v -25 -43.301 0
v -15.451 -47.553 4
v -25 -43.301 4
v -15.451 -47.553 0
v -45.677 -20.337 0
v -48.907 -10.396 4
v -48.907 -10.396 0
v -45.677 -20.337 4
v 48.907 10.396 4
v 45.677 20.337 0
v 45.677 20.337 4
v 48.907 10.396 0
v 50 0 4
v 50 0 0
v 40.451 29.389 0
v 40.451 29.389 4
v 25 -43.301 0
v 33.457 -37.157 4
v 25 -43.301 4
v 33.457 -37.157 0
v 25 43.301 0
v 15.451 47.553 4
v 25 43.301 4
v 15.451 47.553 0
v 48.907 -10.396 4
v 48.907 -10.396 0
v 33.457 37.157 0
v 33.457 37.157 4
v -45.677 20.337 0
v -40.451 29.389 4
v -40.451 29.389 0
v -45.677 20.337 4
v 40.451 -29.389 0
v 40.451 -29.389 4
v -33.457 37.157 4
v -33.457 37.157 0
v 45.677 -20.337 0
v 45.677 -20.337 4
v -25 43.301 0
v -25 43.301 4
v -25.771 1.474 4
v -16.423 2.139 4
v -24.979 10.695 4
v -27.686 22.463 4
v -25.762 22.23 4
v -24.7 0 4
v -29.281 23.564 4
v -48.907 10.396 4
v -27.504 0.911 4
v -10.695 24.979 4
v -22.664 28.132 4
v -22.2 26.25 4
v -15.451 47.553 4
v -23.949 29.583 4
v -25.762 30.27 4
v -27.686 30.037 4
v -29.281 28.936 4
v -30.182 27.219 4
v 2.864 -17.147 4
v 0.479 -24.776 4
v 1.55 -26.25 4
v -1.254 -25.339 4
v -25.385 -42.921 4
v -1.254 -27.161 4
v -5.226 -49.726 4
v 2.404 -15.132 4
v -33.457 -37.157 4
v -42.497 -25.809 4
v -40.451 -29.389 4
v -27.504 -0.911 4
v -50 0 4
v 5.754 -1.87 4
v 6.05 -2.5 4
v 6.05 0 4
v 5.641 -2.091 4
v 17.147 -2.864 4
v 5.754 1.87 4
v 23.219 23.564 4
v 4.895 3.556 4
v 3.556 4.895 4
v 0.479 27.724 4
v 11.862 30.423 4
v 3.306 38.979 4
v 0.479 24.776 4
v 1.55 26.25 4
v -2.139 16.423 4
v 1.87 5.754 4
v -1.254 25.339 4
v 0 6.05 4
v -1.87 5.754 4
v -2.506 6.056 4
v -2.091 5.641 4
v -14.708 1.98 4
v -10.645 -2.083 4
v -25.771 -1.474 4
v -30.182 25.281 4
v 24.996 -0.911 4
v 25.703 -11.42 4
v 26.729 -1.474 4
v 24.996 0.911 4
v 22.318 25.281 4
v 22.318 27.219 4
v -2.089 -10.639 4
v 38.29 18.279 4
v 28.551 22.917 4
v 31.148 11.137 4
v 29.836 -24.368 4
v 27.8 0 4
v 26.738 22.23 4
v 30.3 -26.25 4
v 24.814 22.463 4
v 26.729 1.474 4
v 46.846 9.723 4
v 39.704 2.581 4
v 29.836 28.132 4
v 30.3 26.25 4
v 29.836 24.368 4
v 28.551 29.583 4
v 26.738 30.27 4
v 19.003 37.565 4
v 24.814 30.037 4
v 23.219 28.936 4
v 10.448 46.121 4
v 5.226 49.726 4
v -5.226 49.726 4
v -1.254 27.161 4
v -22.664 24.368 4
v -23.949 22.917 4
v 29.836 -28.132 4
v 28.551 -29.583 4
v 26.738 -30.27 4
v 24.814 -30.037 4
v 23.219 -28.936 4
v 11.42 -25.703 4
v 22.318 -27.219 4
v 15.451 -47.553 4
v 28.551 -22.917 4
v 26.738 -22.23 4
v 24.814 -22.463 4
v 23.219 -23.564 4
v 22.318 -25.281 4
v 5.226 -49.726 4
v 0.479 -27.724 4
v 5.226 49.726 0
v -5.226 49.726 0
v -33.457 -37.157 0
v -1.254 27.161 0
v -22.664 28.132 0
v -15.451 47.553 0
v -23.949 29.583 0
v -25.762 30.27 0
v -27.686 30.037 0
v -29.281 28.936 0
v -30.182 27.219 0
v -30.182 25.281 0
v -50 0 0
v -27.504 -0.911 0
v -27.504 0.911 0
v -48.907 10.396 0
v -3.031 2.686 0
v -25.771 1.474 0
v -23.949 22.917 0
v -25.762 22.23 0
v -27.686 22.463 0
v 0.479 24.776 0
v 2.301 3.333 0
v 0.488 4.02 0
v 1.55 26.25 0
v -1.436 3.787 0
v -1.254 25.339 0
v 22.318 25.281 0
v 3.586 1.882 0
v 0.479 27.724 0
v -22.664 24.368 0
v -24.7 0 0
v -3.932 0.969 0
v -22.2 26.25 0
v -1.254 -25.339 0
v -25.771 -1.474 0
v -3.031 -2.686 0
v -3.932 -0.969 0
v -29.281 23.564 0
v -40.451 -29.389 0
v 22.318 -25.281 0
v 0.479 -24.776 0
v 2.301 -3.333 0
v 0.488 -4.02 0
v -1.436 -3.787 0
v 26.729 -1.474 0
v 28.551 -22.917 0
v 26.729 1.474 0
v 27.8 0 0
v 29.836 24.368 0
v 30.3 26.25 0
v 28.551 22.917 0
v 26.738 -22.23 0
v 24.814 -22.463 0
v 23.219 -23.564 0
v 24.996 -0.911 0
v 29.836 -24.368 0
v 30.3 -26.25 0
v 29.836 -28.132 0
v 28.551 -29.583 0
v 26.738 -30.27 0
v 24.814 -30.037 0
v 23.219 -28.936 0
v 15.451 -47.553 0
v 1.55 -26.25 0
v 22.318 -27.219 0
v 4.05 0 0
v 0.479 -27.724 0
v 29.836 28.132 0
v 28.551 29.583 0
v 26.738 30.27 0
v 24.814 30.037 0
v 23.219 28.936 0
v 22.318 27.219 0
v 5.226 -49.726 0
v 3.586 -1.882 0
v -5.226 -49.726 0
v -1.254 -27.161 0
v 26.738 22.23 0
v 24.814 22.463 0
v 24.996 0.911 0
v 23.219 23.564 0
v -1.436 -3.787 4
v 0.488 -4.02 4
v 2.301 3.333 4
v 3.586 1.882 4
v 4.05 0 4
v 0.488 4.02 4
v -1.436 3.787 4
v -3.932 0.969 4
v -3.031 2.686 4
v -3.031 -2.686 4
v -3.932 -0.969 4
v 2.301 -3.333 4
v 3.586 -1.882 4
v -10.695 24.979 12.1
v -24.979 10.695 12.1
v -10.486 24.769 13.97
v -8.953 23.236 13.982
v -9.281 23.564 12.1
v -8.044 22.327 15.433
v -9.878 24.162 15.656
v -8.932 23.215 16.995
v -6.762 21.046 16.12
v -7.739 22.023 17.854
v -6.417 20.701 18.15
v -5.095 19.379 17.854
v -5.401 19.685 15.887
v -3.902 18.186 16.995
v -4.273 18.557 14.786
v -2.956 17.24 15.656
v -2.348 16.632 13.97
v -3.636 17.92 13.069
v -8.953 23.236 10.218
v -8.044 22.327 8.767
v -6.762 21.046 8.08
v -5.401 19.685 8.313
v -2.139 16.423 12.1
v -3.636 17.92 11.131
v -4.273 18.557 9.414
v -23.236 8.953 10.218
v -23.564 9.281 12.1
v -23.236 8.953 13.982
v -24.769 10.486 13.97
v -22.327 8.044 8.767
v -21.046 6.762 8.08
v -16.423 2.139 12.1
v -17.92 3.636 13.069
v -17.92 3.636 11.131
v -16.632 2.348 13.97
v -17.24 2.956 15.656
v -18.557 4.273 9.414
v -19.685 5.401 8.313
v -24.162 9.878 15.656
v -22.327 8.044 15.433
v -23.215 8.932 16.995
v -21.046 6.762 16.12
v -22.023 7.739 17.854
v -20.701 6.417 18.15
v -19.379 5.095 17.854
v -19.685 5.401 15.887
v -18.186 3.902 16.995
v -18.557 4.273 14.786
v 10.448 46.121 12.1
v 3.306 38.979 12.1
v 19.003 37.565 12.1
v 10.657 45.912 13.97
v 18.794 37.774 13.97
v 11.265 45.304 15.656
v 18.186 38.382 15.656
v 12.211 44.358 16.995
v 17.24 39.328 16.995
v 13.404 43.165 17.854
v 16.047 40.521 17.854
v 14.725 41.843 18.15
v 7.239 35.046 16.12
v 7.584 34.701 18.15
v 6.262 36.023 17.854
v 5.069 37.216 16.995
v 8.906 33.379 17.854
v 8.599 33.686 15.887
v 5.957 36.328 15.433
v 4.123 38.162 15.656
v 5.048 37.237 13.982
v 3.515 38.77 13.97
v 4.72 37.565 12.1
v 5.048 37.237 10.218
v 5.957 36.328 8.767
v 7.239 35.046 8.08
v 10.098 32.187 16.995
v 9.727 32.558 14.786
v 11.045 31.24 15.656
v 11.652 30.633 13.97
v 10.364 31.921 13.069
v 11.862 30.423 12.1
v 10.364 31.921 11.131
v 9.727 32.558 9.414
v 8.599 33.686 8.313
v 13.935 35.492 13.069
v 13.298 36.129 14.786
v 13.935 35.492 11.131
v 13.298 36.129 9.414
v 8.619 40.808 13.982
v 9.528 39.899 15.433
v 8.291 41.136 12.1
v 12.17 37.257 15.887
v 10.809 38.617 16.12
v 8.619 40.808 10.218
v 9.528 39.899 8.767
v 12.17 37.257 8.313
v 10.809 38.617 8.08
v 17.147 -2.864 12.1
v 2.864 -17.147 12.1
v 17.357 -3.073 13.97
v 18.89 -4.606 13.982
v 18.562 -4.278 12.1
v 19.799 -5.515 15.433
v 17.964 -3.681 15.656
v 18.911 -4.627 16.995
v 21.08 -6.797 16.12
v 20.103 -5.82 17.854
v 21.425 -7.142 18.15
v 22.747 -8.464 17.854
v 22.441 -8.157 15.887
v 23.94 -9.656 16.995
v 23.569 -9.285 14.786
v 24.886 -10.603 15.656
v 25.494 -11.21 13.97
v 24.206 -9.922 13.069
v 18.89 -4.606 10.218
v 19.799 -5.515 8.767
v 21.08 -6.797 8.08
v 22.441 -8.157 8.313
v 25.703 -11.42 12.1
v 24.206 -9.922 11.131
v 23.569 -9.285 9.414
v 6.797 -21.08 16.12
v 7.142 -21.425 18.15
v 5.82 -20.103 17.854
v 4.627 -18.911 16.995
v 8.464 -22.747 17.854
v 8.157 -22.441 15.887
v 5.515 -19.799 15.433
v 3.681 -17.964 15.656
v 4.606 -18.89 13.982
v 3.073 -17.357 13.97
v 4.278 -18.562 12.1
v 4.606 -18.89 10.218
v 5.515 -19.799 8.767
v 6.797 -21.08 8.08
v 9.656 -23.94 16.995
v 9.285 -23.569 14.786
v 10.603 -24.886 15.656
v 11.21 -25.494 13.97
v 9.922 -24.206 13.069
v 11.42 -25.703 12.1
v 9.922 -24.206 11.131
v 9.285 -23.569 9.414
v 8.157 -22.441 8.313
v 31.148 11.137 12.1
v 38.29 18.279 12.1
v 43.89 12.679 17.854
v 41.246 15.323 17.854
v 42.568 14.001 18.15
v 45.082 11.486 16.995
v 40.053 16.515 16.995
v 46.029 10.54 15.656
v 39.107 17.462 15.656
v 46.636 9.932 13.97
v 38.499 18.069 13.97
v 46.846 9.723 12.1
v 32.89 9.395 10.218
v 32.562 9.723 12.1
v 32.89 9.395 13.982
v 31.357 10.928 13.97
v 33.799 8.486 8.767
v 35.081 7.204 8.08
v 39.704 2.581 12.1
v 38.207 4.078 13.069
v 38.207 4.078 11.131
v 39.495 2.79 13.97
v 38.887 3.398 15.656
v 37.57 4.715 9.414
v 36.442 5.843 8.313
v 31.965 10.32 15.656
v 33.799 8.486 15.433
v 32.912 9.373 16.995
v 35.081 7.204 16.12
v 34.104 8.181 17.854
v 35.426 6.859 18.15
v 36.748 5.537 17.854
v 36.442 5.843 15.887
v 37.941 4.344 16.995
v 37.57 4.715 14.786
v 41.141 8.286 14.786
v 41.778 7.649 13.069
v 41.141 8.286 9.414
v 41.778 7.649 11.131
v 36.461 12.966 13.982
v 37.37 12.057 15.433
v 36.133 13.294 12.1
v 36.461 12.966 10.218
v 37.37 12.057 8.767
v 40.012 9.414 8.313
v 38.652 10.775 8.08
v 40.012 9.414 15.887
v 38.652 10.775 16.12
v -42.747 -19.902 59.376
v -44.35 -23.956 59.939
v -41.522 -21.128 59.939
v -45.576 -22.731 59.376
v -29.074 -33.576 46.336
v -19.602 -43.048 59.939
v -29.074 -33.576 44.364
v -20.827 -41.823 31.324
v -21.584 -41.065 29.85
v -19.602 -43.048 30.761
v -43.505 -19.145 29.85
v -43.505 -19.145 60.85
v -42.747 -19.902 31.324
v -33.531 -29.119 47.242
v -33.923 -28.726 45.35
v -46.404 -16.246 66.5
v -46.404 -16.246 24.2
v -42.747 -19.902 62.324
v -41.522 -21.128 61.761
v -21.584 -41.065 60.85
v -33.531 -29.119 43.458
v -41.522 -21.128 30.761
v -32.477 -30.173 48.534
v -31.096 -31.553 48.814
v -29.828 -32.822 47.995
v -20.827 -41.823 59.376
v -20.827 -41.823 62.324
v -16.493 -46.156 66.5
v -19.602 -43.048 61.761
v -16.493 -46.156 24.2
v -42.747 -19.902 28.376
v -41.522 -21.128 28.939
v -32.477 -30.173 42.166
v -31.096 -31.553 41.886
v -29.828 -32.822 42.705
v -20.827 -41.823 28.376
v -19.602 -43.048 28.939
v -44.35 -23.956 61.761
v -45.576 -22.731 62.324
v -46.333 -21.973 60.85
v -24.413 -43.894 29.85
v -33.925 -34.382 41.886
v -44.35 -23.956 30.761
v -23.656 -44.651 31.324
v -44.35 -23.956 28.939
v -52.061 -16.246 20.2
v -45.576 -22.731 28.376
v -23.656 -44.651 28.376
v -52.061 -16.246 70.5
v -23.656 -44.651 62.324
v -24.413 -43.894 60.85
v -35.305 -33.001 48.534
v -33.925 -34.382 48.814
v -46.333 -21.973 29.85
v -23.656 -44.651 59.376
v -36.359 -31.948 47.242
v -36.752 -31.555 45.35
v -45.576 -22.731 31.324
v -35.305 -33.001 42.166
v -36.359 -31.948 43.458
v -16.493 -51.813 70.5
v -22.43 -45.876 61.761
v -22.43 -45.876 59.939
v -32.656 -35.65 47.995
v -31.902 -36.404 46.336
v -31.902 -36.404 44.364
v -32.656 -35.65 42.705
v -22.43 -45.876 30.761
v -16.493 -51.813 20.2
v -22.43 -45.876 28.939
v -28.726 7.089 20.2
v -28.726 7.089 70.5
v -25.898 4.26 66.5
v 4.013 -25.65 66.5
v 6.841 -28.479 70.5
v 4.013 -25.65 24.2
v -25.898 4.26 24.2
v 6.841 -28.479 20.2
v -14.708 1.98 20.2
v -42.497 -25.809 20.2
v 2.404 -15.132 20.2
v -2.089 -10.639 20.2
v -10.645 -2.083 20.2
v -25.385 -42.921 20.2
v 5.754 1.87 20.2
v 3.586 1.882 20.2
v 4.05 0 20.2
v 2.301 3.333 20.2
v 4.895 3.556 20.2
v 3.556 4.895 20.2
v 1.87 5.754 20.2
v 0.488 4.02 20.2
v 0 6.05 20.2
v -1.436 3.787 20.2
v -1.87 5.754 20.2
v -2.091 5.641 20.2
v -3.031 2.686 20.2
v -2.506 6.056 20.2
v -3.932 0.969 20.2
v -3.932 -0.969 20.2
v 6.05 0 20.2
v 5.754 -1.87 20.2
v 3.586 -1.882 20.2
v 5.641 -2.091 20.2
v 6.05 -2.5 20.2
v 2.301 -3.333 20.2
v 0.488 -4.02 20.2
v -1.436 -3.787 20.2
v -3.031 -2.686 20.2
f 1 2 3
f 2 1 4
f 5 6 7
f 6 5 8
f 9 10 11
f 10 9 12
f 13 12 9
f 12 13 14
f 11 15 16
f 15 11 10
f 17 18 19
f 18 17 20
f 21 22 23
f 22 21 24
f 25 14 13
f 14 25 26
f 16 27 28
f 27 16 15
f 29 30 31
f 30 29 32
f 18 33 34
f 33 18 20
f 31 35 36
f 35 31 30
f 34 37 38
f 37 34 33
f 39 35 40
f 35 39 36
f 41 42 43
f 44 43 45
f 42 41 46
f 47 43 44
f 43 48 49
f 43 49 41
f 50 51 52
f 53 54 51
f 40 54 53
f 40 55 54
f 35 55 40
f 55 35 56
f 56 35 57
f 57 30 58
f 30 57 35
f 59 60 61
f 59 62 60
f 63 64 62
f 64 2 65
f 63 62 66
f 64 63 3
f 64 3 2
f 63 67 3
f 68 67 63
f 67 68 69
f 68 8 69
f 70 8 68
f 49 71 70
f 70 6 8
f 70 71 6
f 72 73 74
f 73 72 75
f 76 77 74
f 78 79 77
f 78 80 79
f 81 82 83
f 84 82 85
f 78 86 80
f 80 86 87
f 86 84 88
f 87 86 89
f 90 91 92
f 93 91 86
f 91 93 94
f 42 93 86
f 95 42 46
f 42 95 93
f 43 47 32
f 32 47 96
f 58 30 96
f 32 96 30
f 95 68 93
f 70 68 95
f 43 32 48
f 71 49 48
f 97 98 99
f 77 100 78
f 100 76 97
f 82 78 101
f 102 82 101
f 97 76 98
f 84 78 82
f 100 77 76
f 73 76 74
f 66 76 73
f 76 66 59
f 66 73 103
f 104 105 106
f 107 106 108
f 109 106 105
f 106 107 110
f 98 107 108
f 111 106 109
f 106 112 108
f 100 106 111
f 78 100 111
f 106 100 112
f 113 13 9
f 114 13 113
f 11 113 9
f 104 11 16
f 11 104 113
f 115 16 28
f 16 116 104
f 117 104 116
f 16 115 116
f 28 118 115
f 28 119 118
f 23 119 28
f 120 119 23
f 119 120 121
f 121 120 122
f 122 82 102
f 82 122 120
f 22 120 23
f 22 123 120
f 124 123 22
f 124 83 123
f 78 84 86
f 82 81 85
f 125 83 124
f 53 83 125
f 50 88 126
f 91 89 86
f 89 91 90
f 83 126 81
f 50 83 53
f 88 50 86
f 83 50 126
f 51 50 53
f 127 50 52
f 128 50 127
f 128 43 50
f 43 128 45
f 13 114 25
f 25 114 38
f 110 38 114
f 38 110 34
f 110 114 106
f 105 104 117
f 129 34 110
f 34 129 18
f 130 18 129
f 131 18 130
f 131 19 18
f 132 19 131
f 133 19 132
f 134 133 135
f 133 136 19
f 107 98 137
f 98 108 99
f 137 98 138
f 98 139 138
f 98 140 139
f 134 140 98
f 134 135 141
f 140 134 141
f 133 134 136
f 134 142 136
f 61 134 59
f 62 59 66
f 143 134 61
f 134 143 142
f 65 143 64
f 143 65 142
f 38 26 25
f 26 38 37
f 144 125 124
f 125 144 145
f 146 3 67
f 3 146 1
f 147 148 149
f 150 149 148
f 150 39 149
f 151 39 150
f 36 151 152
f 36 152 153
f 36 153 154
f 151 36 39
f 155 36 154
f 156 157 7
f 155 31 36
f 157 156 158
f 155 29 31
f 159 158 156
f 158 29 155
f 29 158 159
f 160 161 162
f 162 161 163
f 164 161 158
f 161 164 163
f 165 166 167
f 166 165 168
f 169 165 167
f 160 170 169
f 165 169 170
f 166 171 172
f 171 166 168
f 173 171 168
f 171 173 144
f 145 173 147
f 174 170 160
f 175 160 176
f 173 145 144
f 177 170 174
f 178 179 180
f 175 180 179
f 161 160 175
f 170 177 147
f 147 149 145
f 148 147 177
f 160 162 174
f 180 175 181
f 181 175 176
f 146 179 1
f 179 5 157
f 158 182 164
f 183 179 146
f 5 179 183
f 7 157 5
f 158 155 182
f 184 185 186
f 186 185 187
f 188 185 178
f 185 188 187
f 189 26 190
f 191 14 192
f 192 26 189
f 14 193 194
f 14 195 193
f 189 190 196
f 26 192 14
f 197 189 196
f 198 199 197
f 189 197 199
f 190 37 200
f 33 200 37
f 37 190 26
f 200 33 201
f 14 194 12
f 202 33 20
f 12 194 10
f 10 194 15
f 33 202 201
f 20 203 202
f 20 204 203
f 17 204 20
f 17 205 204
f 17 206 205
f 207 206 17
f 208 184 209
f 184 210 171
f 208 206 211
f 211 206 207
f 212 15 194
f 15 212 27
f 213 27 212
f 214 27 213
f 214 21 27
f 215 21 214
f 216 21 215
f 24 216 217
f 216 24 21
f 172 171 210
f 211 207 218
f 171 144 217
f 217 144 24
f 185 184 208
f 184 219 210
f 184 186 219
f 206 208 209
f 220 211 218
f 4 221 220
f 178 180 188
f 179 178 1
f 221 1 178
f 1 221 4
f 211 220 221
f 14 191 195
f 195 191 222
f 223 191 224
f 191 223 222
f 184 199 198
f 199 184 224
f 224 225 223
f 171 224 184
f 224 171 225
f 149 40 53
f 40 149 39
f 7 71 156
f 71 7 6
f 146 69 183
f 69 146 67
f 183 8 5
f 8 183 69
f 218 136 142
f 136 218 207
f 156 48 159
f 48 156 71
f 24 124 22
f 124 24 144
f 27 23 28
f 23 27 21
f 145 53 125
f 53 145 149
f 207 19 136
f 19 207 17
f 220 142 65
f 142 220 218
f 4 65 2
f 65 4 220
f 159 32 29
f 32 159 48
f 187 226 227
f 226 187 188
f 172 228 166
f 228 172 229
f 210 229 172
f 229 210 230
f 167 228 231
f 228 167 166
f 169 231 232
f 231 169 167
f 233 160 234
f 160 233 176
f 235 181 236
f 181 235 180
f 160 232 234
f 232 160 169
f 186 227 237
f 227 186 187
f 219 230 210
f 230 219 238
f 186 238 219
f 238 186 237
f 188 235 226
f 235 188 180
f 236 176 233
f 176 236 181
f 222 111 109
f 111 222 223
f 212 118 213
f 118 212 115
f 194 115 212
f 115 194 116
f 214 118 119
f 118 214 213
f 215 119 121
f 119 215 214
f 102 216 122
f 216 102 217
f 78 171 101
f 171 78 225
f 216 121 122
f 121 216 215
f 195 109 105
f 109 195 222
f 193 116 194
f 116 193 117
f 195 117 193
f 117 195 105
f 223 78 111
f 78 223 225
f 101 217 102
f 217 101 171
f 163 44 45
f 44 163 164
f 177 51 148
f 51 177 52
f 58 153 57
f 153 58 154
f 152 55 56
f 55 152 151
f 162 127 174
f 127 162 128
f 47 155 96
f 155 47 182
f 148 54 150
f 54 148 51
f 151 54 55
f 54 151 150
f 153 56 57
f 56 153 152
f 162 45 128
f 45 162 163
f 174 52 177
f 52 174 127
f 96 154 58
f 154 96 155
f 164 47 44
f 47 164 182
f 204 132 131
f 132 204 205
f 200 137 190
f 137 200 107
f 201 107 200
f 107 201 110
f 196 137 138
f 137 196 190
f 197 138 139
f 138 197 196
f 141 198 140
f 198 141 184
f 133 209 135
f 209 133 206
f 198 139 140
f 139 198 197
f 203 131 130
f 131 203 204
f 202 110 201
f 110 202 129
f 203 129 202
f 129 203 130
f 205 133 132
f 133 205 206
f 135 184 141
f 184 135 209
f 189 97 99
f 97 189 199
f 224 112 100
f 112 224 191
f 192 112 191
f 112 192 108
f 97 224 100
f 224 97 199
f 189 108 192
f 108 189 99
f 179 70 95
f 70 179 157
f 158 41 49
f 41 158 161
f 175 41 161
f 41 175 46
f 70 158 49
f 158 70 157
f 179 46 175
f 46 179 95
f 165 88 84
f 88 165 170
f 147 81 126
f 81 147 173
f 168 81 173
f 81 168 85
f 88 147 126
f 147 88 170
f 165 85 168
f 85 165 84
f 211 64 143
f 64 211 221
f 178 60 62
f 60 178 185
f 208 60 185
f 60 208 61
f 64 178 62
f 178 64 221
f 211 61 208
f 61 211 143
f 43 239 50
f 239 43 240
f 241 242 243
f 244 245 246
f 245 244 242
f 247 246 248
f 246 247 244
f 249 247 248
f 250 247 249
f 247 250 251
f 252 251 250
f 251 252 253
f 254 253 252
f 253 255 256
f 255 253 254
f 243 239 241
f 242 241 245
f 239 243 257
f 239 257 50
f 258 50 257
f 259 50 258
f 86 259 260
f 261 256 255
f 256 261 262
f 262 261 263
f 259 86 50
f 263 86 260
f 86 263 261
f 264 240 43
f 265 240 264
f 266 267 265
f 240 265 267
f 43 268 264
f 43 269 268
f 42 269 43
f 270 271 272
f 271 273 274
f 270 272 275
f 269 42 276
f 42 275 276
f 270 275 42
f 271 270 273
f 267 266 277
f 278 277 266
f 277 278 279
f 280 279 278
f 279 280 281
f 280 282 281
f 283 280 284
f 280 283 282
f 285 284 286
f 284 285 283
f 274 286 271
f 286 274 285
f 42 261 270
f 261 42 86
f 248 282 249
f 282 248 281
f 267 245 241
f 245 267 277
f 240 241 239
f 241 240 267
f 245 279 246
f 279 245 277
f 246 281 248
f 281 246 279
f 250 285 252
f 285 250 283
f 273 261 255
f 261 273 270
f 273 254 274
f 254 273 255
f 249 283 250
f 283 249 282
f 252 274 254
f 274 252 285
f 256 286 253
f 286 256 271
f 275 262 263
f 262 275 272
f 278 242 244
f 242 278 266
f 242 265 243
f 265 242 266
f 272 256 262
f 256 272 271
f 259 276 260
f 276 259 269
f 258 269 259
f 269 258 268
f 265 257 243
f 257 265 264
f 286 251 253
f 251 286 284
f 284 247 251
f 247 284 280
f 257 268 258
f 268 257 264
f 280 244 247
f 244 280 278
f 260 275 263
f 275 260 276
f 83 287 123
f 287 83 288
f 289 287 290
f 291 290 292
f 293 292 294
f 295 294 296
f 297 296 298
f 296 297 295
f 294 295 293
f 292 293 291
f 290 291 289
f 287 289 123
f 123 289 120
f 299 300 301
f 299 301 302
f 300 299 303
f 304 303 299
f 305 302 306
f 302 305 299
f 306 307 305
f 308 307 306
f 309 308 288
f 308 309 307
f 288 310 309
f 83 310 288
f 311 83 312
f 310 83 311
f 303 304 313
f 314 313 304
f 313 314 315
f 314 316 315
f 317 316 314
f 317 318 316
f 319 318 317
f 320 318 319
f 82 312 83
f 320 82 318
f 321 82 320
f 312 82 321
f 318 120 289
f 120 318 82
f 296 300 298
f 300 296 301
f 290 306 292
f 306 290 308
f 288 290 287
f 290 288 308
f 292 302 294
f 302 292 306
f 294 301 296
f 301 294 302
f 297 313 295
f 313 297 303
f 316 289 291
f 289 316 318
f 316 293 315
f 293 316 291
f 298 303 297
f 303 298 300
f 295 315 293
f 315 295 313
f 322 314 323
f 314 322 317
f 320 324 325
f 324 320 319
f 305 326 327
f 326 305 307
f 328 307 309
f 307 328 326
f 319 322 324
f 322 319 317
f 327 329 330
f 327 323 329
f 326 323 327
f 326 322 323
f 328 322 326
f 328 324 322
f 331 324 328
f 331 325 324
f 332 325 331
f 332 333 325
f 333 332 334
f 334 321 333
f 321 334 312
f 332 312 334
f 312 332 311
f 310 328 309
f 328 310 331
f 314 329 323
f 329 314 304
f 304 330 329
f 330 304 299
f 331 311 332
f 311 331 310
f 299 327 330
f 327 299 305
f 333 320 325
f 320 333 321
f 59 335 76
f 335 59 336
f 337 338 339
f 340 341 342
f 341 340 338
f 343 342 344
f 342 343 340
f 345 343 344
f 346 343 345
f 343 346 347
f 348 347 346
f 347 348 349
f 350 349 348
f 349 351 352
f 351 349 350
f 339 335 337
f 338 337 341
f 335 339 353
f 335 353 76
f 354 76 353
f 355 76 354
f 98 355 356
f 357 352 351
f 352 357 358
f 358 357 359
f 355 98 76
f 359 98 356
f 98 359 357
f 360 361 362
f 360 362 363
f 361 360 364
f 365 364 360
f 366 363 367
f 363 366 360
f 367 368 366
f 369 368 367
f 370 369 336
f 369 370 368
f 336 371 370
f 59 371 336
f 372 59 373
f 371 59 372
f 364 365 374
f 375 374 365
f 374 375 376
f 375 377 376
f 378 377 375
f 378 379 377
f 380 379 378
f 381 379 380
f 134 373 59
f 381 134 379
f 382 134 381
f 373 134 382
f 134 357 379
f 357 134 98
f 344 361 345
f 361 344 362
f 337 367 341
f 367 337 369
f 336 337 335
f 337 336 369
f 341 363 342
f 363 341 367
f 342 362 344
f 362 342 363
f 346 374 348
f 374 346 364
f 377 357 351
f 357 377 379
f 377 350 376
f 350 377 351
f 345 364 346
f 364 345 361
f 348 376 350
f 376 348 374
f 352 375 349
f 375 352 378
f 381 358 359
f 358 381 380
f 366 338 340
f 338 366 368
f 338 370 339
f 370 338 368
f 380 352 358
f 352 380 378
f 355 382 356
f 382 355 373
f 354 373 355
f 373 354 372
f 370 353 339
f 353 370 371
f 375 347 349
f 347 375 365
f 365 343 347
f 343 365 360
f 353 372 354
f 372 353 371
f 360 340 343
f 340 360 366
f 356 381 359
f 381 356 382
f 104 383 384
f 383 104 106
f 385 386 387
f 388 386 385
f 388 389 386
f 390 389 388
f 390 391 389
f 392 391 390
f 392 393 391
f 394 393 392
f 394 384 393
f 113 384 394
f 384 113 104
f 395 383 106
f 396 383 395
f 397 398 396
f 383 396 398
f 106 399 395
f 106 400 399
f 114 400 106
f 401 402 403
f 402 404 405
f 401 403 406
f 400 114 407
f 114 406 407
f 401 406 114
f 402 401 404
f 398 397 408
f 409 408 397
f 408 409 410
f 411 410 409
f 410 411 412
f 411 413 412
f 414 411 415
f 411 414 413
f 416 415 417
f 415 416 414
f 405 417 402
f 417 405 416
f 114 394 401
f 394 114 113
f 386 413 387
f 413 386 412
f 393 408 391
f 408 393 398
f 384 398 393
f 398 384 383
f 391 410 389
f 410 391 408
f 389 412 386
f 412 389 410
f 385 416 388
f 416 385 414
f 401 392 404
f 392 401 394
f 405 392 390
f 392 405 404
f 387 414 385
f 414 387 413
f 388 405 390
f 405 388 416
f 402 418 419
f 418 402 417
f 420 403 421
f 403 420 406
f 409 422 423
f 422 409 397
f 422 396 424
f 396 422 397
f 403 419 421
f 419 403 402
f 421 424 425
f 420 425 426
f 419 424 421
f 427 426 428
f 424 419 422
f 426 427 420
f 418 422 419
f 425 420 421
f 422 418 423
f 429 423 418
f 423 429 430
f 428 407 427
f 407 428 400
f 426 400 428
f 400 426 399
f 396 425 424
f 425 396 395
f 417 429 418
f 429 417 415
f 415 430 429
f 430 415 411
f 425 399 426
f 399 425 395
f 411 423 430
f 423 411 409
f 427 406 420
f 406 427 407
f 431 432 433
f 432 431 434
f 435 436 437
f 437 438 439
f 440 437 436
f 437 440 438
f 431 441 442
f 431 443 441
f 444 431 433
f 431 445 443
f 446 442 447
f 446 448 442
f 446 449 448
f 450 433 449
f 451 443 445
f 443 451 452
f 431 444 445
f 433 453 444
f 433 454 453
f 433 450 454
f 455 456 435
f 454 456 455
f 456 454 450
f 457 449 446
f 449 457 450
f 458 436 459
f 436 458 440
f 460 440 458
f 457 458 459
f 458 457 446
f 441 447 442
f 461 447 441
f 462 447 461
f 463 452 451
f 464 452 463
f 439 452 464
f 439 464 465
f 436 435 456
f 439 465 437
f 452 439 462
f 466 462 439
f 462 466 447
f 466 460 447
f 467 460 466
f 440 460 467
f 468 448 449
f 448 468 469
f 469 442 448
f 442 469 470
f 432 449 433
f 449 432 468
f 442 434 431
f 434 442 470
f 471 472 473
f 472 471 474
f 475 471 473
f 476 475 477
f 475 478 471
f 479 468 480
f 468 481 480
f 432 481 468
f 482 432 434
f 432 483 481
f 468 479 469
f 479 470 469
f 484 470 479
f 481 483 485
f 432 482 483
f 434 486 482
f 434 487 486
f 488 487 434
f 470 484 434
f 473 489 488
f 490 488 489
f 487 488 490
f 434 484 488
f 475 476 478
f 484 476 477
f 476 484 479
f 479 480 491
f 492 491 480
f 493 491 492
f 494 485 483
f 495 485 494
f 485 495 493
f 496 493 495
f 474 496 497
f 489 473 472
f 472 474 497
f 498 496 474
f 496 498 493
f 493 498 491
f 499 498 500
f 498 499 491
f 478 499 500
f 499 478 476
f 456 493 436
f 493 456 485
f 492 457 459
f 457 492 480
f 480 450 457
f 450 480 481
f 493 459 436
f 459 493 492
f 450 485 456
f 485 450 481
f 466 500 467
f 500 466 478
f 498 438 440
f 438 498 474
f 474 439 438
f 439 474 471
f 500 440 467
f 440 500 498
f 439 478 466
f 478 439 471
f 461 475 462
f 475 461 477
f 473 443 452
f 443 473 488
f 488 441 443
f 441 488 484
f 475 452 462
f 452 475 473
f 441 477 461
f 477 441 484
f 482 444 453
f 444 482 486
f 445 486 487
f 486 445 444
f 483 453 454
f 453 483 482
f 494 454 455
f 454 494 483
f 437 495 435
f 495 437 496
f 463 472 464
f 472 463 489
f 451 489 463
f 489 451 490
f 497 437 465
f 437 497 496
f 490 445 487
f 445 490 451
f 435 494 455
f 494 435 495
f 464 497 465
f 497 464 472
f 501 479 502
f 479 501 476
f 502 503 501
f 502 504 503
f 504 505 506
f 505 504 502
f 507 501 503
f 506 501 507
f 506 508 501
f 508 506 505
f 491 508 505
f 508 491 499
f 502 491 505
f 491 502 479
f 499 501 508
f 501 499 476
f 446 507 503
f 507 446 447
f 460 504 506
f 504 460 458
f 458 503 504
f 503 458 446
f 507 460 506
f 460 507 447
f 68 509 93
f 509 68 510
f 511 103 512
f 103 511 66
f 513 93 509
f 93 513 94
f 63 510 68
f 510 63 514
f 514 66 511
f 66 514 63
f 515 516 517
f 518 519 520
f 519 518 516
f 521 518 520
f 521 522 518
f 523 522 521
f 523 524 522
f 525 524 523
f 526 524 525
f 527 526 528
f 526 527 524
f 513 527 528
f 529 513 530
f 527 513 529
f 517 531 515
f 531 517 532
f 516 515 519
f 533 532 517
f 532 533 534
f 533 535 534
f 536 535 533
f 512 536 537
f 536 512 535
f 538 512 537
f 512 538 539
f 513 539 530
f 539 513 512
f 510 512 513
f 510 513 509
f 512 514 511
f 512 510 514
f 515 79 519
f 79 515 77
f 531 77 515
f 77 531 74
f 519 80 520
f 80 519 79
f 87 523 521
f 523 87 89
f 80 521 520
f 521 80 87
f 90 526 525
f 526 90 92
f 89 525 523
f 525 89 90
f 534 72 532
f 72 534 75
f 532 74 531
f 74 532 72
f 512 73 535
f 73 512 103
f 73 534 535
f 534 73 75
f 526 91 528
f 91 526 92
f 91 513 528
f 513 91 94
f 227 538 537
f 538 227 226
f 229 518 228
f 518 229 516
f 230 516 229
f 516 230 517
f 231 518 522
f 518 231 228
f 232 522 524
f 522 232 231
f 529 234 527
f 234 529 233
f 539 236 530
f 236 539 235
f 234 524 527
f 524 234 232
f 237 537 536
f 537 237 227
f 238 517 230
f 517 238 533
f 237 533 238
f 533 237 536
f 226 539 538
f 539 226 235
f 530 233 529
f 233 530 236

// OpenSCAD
echo(version=version());

// units in mm
BASE_WIDTH = 113.0;
BASE_HEIGHT = 53.0;
BASE_WALL = 4.0;
INNER_RIDGE_HEIGHT = 6.0;
INNER_RIDGE_WIDTH = 2.0;

PLATFORM_WIDTH = 100.0;
PLATFORM_HEIGHT = 4.0;

SUPPORT_WIDTH = BASE_WIDTH - INNER_RIDGE_WIDTH * 4;
SUPPORT_HEIGHT = 20.0;

ROD_WIDTH = 8.1; // m8 
ROD_DEPTH = 10.0;
ROD_PLACEMENT = (BASE_WIDTH - INNER_RIDGE_WIDTH * 4) / 4;

ROD_SHAFT_HEIGHT = 2 * ROD_WIDTH + 4;
ROD_SHAFT_WIDTH = ROD_WIDTH + 4;

STEPPER_ROD_NUT_WIDTH = 13.0;
STEPPER_ROD_HEIGHT = ROD_SHAFT_HEIGHT;
STEPPER_ROD_NUT_WALL = STEPPER_ROD_NUT_WIDTH + 4;

// stepper dims
STEPPER_WIDTH = 42.3;
STEPPER_HEIGHT = 33.0;
STEPPER_SCREW_SPACE = 31.0; 
STEPPER_HALF_SPACE = STEPPER_SCREW_SPACE / 2;
STEPPER_SCREW_SIZE = 3.1; // m3
STEPPER_SHAFT = 7.0;

// top shelf
difference() {
    cylinder(h=PLATFORM_HEIGHT, d=PLATFORM_WIDTH);
    
    // stepper shaft
    cylinder(h=PLATFORM_HEIGHT, d=ROD_WIDTH);
    
    // support rods
    translate([ROD_PLACEMENT, ROD_PLACEMENT, 0])
        cylinder(h=ROD_DEPTH, d=ROD_WIDTH);
    translate([-1 * ROD_PLACEMENT, ROD_PLACEMENT, 0])
        cylinder(h=ROD_DEPTH, d=ROD_WIDTH);
    translate([ROD_PLACEMENT, -1 * ROD_PLACEMENT, 0])
        cylinder(h=ROD_DEPTH, d=ROD_WIDTH);
    
     // bottom/top connections
     translate([ROD_PLACEMENT, 0, 0])
        cylinder(h=PLATFORM_HEIGHT, d=STEPPER_SCREW_SIZE);
     translate([-1 * ROD_PLACEMENT, 0, 0])
        cylinder(h=PLATFORM_HEIGHT, d=STEPPER_SCREW_SIZE);
     translate([0, ROD_PLACEMENT, 0])
        cylinder(h=PLATFORM_HEIGHT, d=STEPPER_SCREW_SIZE);
    translate([0, -1 * ROD_PLACEMENT, 0])
        cylinder(h=PLATFORM_HEIGHT, d=STEPPER_SCREW_SIZE);
}

// rod support + bearing housing
rotate(a=[90, 0, 135]) {
    // middle support
    translate([ROD_PLACEMENT / 2, 0, -1 * ROD_WIDTH - 2]) {
        difference() {
            union() {
                cube([ROD_SHAFT_WIDTH, ROD_SHAFT_WIDTH, ROD_SHAFT_HEIGHT]);
                translate([ROD_SHAFT_WIDTH / 2, ROD_SHAFT_WIDTH, 0]) {
                    cylinder(h=ROD_SHAFT_HEIGHT, d=ROD_SHAFT_WIDTH);
                }
            }
            translate([ROD_SHAFT_WIDTH / 2, ROD_SHAFT_WIDTH, 0]) {
                cylinder(h=ROD_SHAFT_HEIGHT, d=ROD_WIDTH);
            }
        }
    
        // back support
        translate([0, 0, 40])
        difference() {
            union() {
                cube([ROD_SHAFT_WIDTH, ROD_SHAFT_WIDTH, ROD_SHAFT_HEIGHT / 2]);
                translate([ROD_SHAFT_WIDTH / 2, ROD_SHAFT_WIDTH, 0]) {
                    cylinder(h=ROD_SHAFT_HEIGHT / 2, d=ROD_SHAFT_WIDTH);
                }
            }
            translate([ROD_SHAFT_WIDTH / 2, ROD_SHAFT_WIDTH, 0]) {
                cylinder(h=ROD_SHAFT_HEIGHT / 4, d=ROD_WIDTH);
            }
        }
    }

    translate([-1 * ROD_PLACEMENT, 0, -1 * ROD_WIDTH - 2]) {
        difference() {
            union() {
                cube([ROD_SHAFT_WIDTH, ROD_SHAFT_WIDTH, ROD_SHAFT_HEIGHT]);
                translate([ROD_SHAFT_WIDTH / 2, ROD_SHAFT_WIDTH, 0])
                    cylinder(h=ROD_SHAFT_HEIGHT, d=ROD_SHAFT_WIDTH);
            }
            translate([ROD_SHAFT_WIDTH / 2, ROD_SHAFT_WIDTH, 0])
                cylinder(h=ROD_SHAFT_HEIGHT, d=ROD_WIDTH);
        }
        
        // back support
        translate([0, 0, 40])
        difference() {
            union() {
                cube([ROD_SHAFT_WIDTH, ROD_SHAFT_WIDTH, ROD_SHAFT_HEIGHT / 2]);
                translate([ROD_SHAFT_WIDTH / 2, ROD_SHAFT_WIDTH, 0])
                    cylinder(h=ROD_SHAFT_HEIGHT / 2, d=ROD_SHAFT_WIDTH);
            }
            translate([ROD_SHAFT_WIDTH / 2, ROD_SHAFT_WIDTH, 0])
                cylinder(h=ROD_SHAFT_HEIGHT / 4, d=ROD_WIDTH);
        }
    }
    
    // middle support
    translate([-1 * ROD_PLACEMENT + ROD_SHAFT_WIDTH + 1.75, 0, -1 * ROD_SHAFT_WIDTH * 3 - 12]) {
        cube([ROD_SHAFT_WIDTH * 2, ROD_SHAFT_HEIGHT, ROD_SHAFT_WIDTH * 3 + 3]);
        
        STEPPER_HOUSING_WIDTH = STEPPER_WIDTH + BASE_WALL * 2;
        STEPPER_HOUSING_DEPTH = STEPPER_HEIGHT;
        
        translate([-1 * STEPPER_HOUSING_WIDTH / 4, ROD_SHAFT_HEIGHT, 0]) {
            difference() {
                cube([STEPPER_HOUSING_WIDTH, STEPPER_HOUSING_WIDTH, STEPPER_HOUSING_DEPTH]);
                translate([BASE_WALL, BASE_WALL, BASE_WALL]) {
                    cube([STEPPER_WIDTH, STEPPER_WIDTH, STEPPER_HEIGHT]);
                }
                
                translate([STEPPER_HOUSING_WIDTH / 2, STEPPER_HOUSING_WIDTH / 2, 0]) {
                    // stepper mounting screws
                    translate([STEPPER_HALF_SPACE, STEPPER_HALF_SPACE, 0])
                        cylinder(h=BASE_WALL, d=STEPPER_SCREW_SIZE);
                    translate([-1 * STEPPER_HALF_SPACE, STEPPER_HALF_SPACE, 0])
                        cylinder(h=BASE_WALL, d=STEPPER_SCREW_SIZE);
                    translate([-1 * STEPPER_HALF_SPACE, -1 * STEPPER_HALF_SPACE, 0])
                        cylinder(h=BASE_WALL, d=STEPPER_SCREW_SIZE);
                    translate([STEPPER_HALF_SPACE, -1 * STEPPER_HALF_SPACE, 0])
                        cylinder(h=BASE_WALL, d=STEPPER_SCREW_SIZE);
                    
                     // stepper shaft
                     cylinder(h=BASE_WALL, d=STEPPER_SHAFT);

                }
                /* 
                // stepper dims
                STEPPER_WIDTH = 42.3;
                STEPPER_HEIGHT = 33.0;
                STEPPER_SCREW_SPACE = 31.0; 
                STEPPER_HALF_SPACE = STEPPER_SCREW_SPACE / 2;
                STEPPER_SCREW_SIZE = 3.1; // m3
                STEPPER_SHAFT = 7.0;
                */
            }
        }
    }

    // bushing for threaded rod
    rotate([270, 225, 0]) {
        difference() {
            union() {
                cylinder(h=ROD_SHAFT_HEIGHT, d=ROD_SHAFT_WIDTH);
                translate([ROD_SHAFT_WIDTH / 2, -2.5, 0]) {
                    rotate(a=135) {
                        cube([ROD_SHAFT_WIDTH, ROD_SHAFT_WIDTH, ROD_SHAFT_HEIGHT]);
                    }
                }
            }
            cylinder(h=ROD_SHAFT_HEIGHT, d=ROD_WIDTH);
        }
    }
}
